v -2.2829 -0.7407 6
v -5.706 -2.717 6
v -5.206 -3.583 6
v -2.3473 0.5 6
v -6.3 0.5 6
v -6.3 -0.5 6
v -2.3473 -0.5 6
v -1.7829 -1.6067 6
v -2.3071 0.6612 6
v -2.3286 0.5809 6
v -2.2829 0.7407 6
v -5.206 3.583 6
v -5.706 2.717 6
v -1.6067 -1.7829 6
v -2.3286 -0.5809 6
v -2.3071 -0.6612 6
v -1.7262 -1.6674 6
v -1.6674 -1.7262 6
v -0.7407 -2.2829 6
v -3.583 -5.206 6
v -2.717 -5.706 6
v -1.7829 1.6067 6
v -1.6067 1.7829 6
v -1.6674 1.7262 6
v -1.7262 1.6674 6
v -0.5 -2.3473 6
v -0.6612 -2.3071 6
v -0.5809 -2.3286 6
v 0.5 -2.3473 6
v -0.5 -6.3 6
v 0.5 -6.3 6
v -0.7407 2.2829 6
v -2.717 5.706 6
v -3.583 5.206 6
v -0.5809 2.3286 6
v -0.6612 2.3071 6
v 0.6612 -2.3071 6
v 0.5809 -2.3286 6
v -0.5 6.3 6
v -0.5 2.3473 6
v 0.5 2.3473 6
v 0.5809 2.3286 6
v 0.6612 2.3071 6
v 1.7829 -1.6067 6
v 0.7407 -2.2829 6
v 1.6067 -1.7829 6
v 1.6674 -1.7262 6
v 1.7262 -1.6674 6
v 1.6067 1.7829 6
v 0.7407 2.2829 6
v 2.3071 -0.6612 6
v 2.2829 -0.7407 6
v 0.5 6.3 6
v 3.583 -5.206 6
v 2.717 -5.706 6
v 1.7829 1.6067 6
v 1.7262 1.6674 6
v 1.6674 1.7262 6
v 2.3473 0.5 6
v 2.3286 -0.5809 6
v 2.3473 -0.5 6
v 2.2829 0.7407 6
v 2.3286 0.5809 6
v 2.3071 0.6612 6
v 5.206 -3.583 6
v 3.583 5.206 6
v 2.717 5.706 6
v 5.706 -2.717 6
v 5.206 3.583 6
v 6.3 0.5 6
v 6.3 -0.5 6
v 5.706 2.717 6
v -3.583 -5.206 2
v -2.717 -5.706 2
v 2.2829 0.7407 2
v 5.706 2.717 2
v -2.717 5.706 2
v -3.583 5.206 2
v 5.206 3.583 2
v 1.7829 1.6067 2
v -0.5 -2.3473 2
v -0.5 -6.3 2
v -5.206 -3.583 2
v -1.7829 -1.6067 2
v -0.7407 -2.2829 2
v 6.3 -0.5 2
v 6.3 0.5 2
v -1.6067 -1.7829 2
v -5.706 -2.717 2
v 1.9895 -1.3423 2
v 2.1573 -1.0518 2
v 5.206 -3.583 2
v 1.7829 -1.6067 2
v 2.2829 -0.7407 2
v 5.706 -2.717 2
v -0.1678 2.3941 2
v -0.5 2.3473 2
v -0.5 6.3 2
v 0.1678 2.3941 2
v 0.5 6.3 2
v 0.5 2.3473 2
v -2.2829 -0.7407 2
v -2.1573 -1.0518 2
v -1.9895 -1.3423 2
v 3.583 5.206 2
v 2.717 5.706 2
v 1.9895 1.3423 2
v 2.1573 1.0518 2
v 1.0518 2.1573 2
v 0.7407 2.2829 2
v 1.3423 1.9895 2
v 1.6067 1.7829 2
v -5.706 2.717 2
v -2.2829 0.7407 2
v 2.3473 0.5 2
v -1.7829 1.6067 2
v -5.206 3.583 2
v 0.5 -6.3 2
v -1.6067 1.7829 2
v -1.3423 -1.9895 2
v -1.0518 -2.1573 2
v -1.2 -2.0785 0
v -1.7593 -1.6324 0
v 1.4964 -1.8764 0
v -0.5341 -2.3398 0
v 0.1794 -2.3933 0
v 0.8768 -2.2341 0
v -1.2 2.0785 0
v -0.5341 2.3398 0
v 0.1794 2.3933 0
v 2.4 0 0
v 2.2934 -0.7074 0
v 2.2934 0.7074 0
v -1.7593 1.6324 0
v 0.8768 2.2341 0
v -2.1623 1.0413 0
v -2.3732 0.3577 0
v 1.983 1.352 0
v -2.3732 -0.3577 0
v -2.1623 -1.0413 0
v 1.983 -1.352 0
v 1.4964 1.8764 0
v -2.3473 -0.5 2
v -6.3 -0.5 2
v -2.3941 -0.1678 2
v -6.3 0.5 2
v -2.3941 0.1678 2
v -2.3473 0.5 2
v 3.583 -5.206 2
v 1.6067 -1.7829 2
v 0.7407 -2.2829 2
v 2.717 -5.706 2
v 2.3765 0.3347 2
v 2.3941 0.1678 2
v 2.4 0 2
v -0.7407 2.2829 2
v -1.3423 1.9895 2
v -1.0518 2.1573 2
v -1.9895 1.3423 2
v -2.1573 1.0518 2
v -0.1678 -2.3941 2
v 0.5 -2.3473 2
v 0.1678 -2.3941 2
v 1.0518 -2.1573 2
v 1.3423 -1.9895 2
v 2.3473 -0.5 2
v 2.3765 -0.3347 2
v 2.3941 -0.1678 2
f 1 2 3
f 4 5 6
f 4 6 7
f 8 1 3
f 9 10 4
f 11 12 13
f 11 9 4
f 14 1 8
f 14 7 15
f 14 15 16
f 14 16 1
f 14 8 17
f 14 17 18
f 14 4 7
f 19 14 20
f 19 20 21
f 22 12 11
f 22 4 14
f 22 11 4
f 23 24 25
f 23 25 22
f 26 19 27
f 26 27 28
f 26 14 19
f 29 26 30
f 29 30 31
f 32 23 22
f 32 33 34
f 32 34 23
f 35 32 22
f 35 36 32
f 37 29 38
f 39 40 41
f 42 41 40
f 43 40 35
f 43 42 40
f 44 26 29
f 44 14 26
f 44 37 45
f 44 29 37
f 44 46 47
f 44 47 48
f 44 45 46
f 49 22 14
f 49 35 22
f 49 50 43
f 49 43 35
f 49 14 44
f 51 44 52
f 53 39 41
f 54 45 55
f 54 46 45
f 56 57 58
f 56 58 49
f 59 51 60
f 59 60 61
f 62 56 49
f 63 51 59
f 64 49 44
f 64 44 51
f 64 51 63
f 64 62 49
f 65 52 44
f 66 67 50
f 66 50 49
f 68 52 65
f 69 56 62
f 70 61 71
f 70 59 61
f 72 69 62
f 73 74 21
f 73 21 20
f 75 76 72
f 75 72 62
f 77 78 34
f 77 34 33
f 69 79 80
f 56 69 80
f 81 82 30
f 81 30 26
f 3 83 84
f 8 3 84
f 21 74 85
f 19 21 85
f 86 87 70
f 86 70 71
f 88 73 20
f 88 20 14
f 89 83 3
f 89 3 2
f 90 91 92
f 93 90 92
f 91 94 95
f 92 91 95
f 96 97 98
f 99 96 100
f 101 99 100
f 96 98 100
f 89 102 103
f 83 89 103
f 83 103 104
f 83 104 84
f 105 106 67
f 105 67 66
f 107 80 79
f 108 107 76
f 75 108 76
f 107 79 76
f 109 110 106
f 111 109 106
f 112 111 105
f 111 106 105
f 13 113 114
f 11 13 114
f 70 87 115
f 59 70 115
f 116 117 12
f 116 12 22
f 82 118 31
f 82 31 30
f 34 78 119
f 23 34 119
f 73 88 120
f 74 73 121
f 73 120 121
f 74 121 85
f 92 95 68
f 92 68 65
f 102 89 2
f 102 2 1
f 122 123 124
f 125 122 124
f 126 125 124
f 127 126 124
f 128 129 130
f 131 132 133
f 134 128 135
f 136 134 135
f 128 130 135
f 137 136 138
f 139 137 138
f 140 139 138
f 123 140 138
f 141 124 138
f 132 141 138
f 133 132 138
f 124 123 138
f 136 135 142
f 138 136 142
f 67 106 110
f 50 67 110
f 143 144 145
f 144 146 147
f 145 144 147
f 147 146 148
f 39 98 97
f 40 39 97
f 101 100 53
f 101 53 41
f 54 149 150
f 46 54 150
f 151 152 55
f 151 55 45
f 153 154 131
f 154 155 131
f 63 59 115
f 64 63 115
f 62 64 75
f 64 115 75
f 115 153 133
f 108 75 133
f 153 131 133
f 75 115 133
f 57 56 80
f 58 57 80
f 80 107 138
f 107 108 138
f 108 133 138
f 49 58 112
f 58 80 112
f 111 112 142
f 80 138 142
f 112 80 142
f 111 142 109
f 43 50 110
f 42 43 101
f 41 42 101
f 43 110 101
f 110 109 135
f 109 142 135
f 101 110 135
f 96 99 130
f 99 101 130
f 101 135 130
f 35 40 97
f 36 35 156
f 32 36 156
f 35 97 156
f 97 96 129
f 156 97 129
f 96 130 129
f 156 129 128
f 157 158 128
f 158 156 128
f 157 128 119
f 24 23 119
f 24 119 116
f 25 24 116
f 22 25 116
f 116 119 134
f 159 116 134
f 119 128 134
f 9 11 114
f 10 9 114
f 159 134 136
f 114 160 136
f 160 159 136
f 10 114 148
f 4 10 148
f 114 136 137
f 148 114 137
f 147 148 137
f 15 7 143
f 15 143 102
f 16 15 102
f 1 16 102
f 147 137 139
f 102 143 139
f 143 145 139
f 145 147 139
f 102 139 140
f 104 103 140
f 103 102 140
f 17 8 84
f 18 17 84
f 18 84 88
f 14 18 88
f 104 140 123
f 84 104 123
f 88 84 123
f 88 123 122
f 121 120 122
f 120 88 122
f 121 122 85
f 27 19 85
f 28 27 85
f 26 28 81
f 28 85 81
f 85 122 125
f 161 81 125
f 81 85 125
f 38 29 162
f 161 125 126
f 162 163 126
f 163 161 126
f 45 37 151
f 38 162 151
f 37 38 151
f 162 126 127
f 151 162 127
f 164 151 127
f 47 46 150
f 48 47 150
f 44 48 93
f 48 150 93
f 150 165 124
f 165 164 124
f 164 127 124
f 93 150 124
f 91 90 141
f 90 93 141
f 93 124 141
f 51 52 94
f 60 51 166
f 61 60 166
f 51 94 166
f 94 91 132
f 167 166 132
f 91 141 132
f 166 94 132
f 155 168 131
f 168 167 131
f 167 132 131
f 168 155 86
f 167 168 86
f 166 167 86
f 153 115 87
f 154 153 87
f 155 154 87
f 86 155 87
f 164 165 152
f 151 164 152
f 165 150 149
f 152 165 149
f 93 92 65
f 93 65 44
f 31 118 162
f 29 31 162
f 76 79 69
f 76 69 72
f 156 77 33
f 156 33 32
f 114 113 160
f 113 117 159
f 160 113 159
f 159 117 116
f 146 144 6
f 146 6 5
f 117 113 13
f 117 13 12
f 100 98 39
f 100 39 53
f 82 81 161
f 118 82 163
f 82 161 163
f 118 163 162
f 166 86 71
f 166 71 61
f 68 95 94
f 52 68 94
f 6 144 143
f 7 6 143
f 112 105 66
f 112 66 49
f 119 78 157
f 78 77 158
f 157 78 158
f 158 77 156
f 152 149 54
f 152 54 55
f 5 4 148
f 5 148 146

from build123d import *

# Parameters (mm, degrees)
SKETCH_W           = 6.3
SKETCH_H           = 1
PAD_DEPTH          = 4
POLARPATTERN_COUNT = 12
CYLINDER002_R      = 2.4
CYLINDER002_DEPTH  = 6


with BuildPart() as bl_tter:
    # Sketch → Pad (new body)
    with BuildSketch(Plane.XY):
        with Locations((-3.15, 0)):
            Rectangle(SKETCH_W, SKETCH_H)
    pad = extrude(amount=PAD_DEPTH)

    # PolarPattern: Pad ×12 about axis
    polarpattern_axis = Axis((0, 0, 0), (0, 0, 1))
    for i in range(1, POLARPATTERN_COUNT):
        add(pad.rotate(polarpattern_axis, i * 360 / POLARPATTERN_COUNT))


with BuildPart() as bl_tter_1:
    # Body placement: moved
    add(bl_tter.part.moved(Location((0, 0, 2))))


with BuildPart() as schaufelr_der:
    # Cylinder002 → Cylinder002 (new body)
    with BuildSketch(Plane.XY):
        Circle(CYLINDER002_R)
    extrude(amount=CYLINDER002_DEPTH)

    # Fusion: union Blätter
    add(bl_tter_1.part)


solid = schaufelr_der.part
